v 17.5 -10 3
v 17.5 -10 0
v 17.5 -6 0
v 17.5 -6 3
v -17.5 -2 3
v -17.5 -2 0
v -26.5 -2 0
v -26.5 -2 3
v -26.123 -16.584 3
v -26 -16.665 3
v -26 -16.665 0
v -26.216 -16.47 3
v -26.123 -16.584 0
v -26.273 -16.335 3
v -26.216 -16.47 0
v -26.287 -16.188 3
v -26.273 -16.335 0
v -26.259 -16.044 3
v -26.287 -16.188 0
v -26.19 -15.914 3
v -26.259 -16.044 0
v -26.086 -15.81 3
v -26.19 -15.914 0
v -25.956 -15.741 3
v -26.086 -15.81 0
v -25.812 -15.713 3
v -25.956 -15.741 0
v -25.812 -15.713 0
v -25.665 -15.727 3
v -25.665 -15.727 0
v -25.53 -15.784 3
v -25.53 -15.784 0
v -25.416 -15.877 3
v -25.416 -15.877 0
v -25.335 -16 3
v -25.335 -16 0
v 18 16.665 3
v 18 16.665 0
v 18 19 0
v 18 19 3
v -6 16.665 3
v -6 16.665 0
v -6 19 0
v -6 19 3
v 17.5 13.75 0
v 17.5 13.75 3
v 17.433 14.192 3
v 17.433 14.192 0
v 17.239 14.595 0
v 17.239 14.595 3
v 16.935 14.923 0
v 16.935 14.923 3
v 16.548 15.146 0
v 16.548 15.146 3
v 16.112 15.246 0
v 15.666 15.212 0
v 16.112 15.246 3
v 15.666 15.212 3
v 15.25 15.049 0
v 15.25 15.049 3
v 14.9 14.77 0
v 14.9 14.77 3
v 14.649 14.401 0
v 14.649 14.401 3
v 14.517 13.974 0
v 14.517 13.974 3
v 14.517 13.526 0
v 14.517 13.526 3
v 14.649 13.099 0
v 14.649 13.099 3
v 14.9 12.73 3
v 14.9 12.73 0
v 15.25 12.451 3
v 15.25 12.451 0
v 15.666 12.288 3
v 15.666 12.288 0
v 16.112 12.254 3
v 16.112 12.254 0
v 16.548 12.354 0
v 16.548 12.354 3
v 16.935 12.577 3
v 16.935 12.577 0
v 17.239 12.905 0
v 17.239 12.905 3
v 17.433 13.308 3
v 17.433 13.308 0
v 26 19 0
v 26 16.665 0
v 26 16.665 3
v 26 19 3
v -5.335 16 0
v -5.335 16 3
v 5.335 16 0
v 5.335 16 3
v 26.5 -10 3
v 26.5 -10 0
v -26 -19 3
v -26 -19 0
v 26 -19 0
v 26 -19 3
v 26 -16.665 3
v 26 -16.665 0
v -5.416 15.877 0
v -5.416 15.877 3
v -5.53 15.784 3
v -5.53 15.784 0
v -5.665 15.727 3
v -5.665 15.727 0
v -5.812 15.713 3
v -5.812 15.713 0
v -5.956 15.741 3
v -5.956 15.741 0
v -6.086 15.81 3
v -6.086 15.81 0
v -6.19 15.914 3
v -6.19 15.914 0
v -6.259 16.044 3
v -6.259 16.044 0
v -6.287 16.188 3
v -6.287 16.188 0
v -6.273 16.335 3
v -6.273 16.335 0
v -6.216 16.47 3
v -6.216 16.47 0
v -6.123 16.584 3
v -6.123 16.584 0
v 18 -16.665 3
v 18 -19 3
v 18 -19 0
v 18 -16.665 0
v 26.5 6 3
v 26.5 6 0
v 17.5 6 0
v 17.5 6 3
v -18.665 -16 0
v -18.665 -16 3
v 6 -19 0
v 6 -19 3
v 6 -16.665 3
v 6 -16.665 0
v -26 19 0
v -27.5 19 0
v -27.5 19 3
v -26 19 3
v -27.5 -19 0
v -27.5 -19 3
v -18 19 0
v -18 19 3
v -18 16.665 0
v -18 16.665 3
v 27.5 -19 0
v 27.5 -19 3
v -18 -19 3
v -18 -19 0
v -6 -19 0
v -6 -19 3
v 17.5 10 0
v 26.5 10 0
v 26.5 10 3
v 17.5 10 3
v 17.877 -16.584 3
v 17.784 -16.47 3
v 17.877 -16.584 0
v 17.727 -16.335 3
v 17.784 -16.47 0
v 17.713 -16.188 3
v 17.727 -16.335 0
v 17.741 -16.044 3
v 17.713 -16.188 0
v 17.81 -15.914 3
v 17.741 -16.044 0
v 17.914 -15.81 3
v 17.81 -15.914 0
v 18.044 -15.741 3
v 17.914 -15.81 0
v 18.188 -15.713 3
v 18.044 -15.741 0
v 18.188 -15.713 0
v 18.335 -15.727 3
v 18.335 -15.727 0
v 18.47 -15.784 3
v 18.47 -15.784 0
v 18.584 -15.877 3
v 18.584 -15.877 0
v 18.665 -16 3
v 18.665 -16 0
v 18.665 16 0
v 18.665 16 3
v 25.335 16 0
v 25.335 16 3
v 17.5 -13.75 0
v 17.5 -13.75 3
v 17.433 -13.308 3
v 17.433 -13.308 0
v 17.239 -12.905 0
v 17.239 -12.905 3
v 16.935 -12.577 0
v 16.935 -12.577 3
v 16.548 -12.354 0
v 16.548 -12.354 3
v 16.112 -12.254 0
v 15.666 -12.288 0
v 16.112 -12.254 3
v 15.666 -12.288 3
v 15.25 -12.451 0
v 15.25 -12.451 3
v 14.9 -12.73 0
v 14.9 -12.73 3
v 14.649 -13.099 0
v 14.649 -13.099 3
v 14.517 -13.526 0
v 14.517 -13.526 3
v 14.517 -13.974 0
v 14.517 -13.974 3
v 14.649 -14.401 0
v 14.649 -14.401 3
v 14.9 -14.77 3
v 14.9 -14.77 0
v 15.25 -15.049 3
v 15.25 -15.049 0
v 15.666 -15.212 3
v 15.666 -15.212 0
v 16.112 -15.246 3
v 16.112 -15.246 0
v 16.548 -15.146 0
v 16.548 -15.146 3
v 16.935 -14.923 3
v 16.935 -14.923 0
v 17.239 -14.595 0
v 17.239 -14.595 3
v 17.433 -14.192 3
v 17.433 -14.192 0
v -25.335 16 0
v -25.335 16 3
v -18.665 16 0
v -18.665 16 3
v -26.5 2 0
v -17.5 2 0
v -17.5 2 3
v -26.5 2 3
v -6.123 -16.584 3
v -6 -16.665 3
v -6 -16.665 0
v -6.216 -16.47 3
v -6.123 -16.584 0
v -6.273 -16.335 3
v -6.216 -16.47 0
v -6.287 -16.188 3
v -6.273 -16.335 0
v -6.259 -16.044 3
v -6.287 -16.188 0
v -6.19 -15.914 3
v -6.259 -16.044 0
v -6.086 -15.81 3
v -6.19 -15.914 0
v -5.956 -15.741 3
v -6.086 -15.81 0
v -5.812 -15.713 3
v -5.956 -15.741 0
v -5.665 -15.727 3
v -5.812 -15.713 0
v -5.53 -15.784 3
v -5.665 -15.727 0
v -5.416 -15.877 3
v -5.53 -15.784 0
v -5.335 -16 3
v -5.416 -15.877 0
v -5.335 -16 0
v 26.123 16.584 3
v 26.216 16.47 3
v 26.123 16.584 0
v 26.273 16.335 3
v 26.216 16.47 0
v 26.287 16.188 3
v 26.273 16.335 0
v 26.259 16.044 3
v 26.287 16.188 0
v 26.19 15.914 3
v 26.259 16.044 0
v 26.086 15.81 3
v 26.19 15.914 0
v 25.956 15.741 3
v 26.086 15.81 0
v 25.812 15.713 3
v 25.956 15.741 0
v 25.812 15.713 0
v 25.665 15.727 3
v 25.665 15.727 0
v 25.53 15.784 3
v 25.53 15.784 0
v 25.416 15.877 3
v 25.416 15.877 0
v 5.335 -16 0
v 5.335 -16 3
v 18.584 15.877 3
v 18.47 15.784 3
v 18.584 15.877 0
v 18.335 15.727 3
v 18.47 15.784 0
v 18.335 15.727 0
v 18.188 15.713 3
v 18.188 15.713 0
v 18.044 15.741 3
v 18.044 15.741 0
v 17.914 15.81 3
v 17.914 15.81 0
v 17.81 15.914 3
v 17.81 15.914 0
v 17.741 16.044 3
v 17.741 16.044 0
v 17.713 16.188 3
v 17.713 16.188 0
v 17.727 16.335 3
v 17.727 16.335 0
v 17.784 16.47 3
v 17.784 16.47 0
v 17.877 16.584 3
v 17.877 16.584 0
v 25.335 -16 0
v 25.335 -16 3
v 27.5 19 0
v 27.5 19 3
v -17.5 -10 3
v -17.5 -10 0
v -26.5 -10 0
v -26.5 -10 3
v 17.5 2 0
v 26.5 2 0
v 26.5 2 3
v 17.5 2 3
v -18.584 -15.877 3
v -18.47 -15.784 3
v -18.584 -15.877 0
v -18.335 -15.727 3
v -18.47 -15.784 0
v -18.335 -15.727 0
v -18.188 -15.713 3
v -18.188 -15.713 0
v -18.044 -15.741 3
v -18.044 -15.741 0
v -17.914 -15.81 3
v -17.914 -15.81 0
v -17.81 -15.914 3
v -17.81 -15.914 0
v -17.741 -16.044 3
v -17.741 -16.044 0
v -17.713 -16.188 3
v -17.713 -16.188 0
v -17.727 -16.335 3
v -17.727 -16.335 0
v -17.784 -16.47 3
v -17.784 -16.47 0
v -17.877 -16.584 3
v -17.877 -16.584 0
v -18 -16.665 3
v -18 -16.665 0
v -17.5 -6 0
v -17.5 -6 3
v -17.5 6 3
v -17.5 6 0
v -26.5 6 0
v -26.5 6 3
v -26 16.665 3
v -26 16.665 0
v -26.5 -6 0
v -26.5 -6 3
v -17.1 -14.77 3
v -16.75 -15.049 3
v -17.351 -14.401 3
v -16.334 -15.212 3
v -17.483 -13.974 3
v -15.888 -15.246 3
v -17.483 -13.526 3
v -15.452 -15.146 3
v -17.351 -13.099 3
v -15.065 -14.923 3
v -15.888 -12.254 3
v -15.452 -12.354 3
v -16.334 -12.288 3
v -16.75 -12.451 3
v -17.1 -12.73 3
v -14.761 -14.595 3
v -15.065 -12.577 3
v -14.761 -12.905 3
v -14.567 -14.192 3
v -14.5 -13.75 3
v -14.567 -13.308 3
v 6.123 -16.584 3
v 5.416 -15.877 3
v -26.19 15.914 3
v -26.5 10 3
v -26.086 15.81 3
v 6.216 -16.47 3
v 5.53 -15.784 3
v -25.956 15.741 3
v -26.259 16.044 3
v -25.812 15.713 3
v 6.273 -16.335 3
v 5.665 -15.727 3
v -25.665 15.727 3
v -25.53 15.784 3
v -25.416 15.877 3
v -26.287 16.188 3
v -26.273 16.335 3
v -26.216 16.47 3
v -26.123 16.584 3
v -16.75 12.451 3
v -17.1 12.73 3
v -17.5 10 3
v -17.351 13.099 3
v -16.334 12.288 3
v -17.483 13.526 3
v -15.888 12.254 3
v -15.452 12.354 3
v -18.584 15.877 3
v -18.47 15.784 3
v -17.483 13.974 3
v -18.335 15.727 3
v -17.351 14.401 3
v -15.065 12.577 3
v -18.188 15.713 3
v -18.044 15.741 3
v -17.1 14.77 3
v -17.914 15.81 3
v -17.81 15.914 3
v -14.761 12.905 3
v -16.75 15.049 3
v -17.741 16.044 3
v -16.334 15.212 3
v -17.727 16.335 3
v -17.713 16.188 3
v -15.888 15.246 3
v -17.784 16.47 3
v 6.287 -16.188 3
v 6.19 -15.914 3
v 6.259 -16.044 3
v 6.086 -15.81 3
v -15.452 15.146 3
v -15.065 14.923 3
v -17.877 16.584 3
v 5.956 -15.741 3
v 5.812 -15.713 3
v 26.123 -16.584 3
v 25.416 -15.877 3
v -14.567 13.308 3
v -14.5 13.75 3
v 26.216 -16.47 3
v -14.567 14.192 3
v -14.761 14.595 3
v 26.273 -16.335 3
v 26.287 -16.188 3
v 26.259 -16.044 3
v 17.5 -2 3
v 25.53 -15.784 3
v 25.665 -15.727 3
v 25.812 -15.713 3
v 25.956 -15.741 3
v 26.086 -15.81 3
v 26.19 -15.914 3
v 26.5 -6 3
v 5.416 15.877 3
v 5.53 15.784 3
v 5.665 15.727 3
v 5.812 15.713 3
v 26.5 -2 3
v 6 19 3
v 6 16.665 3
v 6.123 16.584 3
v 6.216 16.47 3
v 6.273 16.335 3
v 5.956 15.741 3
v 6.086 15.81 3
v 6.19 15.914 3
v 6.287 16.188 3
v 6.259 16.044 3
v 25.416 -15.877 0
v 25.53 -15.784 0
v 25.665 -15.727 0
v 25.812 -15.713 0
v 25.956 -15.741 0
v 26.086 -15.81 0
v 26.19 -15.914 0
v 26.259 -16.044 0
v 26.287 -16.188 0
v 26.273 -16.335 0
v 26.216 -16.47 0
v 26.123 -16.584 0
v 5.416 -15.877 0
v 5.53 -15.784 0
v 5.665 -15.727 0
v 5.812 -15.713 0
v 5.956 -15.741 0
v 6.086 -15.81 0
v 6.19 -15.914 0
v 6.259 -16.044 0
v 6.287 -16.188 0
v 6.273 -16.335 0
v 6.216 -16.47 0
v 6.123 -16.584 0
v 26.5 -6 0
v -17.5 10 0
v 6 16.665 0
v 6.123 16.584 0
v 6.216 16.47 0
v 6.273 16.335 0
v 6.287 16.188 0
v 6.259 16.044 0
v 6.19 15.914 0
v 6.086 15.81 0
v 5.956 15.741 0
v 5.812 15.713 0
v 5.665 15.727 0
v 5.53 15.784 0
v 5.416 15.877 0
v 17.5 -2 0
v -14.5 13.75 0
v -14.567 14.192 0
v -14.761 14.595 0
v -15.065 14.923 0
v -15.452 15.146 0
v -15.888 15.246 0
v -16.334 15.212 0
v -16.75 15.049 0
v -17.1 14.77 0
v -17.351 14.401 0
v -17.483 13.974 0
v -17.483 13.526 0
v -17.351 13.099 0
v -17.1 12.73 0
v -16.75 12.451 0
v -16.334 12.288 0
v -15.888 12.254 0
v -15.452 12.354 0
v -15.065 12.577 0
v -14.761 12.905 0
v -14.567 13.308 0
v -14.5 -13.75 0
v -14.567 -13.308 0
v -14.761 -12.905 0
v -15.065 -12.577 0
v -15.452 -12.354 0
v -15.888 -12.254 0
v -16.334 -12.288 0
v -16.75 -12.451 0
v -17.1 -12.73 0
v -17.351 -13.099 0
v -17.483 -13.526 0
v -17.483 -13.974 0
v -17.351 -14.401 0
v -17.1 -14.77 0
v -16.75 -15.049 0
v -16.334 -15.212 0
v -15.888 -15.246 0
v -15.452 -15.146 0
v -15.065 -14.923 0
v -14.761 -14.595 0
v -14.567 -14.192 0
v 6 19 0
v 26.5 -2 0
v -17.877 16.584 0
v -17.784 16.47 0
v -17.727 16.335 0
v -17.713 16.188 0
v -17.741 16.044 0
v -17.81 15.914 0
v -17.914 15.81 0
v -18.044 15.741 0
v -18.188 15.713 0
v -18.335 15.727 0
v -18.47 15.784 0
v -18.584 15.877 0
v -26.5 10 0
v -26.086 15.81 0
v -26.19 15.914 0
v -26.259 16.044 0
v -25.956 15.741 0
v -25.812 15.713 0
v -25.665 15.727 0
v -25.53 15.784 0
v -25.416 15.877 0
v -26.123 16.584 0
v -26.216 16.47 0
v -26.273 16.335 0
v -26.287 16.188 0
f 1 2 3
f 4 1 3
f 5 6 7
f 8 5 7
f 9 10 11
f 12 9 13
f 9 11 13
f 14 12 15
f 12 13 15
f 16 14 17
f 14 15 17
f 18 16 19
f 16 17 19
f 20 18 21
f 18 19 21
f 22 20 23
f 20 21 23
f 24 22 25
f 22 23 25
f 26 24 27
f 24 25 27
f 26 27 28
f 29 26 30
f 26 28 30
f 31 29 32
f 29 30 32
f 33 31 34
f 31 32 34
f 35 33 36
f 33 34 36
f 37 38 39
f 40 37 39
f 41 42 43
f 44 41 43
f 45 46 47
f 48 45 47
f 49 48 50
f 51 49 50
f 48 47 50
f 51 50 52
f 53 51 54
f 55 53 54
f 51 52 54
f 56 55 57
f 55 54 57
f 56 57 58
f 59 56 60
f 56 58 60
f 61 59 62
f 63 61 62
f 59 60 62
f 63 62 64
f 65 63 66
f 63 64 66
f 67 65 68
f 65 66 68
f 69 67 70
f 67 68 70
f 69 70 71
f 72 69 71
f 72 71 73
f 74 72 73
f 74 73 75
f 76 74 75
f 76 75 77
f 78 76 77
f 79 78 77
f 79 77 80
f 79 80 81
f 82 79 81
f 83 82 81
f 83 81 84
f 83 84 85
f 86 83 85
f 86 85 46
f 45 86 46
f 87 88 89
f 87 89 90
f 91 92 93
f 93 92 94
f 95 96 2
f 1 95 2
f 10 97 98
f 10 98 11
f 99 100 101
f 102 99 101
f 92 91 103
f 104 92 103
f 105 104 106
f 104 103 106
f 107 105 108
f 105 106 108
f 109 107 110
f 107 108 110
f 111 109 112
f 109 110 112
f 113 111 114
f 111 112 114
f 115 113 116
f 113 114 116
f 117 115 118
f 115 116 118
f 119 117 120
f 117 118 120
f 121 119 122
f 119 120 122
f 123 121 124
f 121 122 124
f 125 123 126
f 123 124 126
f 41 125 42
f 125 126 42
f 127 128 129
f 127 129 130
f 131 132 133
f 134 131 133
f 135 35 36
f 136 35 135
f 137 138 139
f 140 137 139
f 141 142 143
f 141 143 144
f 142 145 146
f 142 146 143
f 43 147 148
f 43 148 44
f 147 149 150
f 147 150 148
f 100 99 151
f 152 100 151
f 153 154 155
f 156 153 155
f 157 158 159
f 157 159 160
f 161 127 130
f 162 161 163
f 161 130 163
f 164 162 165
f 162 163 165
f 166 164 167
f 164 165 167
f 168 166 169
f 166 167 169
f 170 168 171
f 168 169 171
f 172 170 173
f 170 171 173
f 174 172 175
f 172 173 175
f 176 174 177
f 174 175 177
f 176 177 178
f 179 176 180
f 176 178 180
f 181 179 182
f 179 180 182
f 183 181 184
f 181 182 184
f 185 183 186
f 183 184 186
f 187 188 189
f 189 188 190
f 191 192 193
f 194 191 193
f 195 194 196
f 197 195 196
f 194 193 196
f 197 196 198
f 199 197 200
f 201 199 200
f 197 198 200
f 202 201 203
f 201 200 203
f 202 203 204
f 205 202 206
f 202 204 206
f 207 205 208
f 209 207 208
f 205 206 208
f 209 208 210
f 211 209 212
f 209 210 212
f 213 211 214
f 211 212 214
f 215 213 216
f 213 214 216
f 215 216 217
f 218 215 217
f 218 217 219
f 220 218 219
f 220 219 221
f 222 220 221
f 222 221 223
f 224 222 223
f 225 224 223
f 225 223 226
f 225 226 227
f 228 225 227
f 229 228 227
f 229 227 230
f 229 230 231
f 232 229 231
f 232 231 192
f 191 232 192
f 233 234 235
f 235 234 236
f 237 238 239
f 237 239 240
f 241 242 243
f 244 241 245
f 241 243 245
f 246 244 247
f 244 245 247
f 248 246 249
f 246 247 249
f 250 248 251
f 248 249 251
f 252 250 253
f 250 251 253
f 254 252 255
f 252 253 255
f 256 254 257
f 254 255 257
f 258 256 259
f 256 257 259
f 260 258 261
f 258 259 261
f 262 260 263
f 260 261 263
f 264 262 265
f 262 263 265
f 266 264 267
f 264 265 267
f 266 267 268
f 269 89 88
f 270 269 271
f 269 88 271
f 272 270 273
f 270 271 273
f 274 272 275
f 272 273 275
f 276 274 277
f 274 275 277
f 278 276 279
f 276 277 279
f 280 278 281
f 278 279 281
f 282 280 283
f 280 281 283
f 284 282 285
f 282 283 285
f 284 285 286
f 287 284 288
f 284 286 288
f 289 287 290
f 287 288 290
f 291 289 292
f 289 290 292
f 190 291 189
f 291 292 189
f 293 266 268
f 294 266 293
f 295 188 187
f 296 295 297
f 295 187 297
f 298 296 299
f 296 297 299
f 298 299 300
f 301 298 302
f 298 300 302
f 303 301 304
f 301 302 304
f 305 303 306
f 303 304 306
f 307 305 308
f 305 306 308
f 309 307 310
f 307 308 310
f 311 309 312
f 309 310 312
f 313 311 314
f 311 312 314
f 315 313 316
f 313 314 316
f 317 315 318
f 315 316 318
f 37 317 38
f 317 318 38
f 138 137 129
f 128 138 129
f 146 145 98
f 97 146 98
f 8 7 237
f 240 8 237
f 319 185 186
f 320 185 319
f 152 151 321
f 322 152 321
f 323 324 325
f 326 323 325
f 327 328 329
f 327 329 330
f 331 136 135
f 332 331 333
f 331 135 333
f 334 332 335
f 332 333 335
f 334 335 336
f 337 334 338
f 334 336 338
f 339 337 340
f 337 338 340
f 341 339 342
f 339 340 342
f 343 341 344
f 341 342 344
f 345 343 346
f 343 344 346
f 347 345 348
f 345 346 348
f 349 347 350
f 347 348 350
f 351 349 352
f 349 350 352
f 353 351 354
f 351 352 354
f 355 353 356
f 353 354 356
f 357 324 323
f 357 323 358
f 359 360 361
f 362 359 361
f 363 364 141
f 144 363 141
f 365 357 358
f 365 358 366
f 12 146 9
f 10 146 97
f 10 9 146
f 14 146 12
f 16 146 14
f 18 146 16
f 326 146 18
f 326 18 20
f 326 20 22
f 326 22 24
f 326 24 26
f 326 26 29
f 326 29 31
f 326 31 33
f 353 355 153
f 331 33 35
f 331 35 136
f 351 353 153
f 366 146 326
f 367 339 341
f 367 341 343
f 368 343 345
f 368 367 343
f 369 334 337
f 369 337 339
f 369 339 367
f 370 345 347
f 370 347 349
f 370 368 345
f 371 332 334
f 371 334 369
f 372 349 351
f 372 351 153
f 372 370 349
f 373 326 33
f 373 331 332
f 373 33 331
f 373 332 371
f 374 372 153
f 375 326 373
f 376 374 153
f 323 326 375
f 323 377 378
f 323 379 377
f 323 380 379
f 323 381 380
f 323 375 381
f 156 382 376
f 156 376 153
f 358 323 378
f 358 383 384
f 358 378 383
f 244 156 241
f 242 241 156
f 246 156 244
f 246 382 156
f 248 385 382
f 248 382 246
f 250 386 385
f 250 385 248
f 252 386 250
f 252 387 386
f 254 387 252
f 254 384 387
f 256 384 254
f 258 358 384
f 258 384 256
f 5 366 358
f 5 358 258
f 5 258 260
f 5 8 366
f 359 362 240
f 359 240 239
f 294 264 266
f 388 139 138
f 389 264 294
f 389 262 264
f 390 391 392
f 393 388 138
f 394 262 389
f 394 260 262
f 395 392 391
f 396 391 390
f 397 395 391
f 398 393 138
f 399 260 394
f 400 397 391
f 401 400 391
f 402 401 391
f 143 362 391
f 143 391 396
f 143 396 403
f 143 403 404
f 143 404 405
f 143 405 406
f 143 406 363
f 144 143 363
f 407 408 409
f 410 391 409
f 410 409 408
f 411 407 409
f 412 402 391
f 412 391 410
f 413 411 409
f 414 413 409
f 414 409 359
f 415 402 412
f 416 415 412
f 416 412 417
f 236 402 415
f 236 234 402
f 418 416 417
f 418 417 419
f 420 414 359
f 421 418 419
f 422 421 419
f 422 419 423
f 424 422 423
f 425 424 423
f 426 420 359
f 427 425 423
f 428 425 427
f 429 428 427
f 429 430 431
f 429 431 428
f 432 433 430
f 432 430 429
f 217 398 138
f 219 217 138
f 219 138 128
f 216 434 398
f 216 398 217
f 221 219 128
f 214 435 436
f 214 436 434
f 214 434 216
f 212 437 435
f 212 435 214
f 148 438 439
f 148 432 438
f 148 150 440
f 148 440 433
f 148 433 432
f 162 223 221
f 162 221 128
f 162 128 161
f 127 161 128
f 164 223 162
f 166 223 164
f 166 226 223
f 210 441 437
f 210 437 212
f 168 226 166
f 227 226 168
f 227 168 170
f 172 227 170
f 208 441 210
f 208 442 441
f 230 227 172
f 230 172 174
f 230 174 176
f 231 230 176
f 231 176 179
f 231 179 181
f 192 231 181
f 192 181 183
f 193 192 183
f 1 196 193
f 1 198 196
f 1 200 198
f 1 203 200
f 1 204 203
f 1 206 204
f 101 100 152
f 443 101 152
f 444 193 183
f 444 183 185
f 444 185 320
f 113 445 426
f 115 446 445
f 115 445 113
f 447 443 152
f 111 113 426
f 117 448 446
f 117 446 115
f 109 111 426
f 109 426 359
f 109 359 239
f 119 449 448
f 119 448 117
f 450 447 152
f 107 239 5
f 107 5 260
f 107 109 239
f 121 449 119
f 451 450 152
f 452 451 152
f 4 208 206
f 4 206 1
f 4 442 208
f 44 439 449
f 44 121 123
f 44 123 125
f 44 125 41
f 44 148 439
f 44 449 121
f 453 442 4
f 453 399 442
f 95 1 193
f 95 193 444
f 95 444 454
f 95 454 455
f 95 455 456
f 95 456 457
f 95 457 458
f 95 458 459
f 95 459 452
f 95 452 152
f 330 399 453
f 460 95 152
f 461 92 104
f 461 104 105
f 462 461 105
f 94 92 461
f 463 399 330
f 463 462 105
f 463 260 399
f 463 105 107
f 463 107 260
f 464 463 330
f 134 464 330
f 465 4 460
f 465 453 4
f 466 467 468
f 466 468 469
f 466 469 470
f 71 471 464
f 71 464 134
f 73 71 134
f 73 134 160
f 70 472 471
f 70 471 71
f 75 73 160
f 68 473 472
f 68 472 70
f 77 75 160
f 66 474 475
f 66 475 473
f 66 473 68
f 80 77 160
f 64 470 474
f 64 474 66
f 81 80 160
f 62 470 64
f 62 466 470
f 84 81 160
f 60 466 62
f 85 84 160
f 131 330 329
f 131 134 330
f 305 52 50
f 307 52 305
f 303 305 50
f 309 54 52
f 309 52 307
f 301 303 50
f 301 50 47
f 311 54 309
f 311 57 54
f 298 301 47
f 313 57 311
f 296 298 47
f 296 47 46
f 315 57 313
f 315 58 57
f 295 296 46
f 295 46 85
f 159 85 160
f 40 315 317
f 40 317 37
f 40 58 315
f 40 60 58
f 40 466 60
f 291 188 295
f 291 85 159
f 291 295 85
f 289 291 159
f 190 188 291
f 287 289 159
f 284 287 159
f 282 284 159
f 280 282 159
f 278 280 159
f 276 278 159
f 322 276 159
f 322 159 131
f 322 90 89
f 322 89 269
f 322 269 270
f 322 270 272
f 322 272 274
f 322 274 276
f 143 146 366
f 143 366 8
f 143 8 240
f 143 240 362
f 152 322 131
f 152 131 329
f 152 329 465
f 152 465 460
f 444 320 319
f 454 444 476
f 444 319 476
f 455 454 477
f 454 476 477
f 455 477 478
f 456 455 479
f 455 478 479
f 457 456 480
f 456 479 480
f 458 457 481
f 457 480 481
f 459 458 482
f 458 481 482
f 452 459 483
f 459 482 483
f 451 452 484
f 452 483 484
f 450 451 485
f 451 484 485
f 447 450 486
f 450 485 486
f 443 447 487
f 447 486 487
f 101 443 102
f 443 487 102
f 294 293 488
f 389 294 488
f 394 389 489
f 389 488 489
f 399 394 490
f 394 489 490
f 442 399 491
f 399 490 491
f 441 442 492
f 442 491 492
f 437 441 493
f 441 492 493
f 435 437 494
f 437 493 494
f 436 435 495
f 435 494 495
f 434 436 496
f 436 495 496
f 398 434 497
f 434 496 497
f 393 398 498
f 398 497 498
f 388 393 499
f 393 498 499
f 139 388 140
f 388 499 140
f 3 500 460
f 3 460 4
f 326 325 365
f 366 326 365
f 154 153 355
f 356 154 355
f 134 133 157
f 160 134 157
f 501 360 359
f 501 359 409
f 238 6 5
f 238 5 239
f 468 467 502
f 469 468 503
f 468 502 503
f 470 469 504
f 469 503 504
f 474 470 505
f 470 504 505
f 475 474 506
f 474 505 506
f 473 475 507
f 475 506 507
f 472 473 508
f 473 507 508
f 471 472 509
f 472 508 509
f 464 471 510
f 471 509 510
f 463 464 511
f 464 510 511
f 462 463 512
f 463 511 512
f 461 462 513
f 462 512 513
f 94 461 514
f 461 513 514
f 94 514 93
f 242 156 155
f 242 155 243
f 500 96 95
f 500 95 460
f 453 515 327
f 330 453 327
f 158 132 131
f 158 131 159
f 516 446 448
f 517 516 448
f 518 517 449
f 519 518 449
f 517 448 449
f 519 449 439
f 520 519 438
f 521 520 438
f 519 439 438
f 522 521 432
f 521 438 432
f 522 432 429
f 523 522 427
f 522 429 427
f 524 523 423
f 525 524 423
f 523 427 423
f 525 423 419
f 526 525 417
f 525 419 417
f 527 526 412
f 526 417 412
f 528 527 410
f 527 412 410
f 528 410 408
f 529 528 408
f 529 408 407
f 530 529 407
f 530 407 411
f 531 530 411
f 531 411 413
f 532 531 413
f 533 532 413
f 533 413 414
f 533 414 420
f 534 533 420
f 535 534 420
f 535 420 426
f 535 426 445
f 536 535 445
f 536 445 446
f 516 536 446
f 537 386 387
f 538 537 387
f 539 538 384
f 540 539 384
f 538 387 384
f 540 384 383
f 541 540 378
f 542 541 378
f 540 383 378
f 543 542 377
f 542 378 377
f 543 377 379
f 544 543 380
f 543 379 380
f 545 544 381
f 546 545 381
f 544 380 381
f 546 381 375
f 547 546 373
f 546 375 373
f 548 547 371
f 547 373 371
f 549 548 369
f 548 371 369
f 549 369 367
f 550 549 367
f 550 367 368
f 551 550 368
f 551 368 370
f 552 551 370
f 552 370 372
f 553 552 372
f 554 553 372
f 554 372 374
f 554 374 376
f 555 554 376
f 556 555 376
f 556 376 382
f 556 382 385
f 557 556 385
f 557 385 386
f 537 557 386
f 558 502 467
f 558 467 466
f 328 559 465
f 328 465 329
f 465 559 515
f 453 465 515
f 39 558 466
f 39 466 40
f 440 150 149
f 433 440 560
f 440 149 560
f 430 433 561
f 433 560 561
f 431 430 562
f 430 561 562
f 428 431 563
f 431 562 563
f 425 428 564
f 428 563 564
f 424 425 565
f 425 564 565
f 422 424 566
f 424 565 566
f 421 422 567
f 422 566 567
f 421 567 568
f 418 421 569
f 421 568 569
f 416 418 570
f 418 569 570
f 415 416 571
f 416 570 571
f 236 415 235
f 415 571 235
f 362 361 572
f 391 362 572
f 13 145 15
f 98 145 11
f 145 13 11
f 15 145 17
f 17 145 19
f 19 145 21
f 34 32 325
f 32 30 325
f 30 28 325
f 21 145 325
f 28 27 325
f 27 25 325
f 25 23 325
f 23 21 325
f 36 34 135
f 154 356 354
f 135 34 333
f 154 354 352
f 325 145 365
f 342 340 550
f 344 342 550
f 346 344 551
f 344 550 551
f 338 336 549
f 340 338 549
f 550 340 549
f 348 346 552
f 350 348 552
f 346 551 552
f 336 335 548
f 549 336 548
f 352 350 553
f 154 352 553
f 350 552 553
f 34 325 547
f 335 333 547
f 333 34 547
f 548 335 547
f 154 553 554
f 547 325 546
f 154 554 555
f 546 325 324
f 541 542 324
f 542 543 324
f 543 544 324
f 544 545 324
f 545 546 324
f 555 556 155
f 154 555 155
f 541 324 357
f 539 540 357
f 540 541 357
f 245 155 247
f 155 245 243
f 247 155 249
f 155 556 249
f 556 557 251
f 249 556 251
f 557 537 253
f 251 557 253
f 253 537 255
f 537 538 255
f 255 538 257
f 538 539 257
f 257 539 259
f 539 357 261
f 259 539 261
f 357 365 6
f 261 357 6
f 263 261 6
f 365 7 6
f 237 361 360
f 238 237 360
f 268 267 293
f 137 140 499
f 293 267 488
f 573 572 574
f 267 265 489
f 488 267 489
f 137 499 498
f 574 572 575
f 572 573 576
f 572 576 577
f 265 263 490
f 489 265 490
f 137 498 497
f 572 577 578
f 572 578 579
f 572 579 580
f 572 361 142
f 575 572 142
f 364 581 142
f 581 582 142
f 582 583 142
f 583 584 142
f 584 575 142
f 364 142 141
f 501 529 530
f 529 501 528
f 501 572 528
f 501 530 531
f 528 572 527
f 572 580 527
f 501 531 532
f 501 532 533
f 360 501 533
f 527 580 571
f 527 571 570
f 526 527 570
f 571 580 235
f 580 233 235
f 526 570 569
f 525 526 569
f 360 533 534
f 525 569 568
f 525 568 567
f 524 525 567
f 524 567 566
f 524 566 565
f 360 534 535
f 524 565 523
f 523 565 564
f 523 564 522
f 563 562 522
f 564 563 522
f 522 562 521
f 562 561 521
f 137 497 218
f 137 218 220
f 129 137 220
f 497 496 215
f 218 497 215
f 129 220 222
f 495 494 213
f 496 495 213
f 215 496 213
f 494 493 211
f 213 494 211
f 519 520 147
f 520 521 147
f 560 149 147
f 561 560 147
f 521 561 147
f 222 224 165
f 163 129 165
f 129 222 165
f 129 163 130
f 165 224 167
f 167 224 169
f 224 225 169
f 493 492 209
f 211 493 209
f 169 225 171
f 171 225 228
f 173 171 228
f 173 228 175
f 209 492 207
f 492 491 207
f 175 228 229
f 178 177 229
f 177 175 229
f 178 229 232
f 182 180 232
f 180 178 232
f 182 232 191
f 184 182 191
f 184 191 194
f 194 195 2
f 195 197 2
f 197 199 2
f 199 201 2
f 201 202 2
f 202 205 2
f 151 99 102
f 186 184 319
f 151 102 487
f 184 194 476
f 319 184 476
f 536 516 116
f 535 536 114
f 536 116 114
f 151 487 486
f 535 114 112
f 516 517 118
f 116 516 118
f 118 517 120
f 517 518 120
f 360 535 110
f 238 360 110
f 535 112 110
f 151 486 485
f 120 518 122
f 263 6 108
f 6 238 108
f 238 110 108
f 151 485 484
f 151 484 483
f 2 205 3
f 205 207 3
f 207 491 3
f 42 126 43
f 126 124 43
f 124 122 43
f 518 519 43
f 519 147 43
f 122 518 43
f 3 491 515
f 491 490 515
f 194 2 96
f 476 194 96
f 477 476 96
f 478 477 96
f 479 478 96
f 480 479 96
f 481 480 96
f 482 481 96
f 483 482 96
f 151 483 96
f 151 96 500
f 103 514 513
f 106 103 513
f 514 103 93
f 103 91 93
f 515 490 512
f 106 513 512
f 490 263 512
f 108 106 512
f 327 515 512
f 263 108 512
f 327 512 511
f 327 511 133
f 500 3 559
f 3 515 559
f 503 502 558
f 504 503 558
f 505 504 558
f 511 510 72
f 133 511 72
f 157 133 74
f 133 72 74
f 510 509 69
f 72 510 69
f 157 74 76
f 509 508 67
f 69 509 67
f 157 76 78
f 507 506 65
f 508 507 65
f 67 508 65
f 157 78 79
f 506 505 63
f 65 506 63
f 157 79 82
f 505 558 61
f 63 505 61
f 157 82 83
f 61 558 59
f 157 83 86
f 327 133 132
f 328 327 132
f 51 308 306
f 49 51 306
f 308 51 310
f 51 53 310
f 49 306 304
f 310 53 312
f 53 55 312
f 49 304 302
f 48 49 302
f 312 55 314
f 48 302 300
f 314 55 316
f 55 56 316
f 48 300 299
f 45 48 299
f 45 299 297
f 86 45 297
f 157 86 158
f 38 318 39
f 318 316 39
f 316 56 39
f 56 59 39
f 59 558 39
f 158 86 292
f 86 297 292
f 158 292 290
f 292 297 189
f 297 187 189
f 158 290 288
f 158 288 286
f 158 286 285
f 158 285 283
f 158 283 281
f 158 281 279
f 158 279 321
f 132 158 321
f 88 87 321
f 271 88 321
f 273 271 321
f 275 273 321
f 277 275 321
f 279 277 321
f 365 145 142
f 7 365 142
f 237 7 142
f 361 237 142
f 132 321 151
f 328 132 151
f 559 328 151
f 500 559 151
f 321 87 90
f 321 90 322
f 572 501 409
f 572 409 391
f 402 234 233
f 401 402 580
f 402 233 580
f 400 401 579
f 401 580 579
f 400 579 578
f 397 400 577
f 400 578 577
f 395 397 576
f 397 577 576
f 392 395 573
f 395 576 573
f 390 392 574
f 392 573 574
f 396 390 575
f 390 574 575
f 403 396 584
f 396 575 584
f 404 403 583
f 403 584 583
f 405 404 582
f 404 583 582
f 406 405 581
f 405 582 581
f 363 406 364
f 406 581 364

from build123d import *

# Parameters (mm, degrees)
SKETCH_1_W          = 55
SKETCH_1_H          = 38
EXTRUDE_1_DEPTH     = 3
SKETCH_2_R          = 1.5
CUT_EXTRUDE_1_DEPTH = 30
SKETCH_3_W          = 8
SKETCH_3_H          = 3
CUT_EXTRUDE_2_DEPTH = 30
SKETCH_5_W          = 12
SKETCH_5_H          = 3
CUT_EXTRUDE_4_DEPTH = 10
SKETCH_6_W          = 9
SKETCH_6_H          = 4
CUT_EXTRUDE_5_DEPTH = 10
SKETCH_7_R          = 0.5
CUT_EXTRUDE_6_DEPTH = 10


with BuildPart() as part:
    # 草图1 → 凸台-拉伸1 (new body)
    with BuildSketch(Plane.XY):
        Rectangle(SKETCH_1_W, SKETCH_1_H)
    extrude(amount=EXTRUDE_1_DEPTH)

    # 草图2 → 切除-拉伸1 (cut)
    with BuildSketch(Plane.XY.offset(3)):
        with Locations((16, 13.75)):
            Circle(SKETCH_2_R)
        with Locations((16, -13.75)):
            Circle(SKETCH_2_R)
        with Locations((-16, 13.75)):
            Circle(SKETCH_2_R)
        with Locations((-16, -13.75)):
            Circle(SKETCH_2_R)
    extrude(amount=-CUT_EXTRUDE_1_DEPTH, mode=Mode.SUBTRACT)

    # 草图3 → 切除-拉伸2 (cut)
    with BuildSketch(Plane.XY.offset(3)):
        with Locations((22, 17.5)):
            Rectangle(SKETCH_3_W, SKETCH_3_H)
        with Locations((22, -17.5)):
            Rectangle(SKETCH_3_W, SKETCH_3_H)
        with Locations((-22, 17.5)):
            Rectangle(SKETCH_3_W, SKETCH_3_H)
        with Locations((-22, -17.5)):
            Rectangle(SKETCH_3_W, SKETCH_3_H)
    extrude(amount=-CUT_EXTRUDE_2_DEPTH, mode=Mode.SUBTRACT)

    # 草图5 → 切除-拉伸4 (cut)
    with BuildSketch(Plane.XY.offset(3)):
        with Locations((0, -17.5)):
            Rectangle(SKETCH_5_W, SKETCH_5_H)
        with Locations((0, 17.5)):
            Rectangle(SKETCH_5_W, SKETCH_5_H)
    extrude(amount=-CUT_EXTRUDE_4_DEPTH, mode=Mode.SUBTRACT)

    # 草图6 → 切除-拉伸5 (cut)
    with BuildSketch(Plane(origin=(0, 0, 0), x_dir=(-1, 0, 0), z_dir=(0, 0, -1))):
        with Locations((-22, -8)):
            Rectangle(SKETCH_6_W, SKETCH_6_H)
        with Locations((-22, 0)):
            Rectangle(SKETCH_6_W, SKETCH_6_H)
        with Locations((-22, 8)):
            Rectangle(SKETCH_6_W, SKETCH_6_H)
        with Locations((22, -8)):
            Rectangle(SKETCH_6_W, SKETCH_6_H)
        with Locations((22, 0)):
            Rectangle(SKETCH_6_W, SKETCH_6_H)
        with Locations((22, 8)):
            Rectangle(SKETCH_6_W, SKETCH_6_H)
    extrude(amount=-CUT_EXTRUDE_5_DEPTH, mode=Mode.SUBTRACT)

    # 草图7 → 切除-拉伸6 (cut)
    with BuildSketch(Plane(origin=(0, 0, 0), x_dir=(-1, 0, 0), z_dir=(0, 0, -1))):
        with Locations((-18.212132034, -16.212132034)):
            Circle(SKETCH_7_R)
        with Locations((-25.787867966, -16.212132034)):
            Circle(SKETCH_7_R)
        with Locations((-25.787867966, 16.212132034)):
            Circle(SKETCH_7_R)
        with Locations((-18.212132034, 16.212132034)):
            Circle(SKETCH_7_R)
        with Locations((-5.787867966, -16.212132034)):
            Circle(SKETCH_7_R)
        with Locations((25.787867966, -16.212132034)):
            Circle(SKETCH_7_R)
        with Locations((18.212132034, -16.212132034)):
            Circle(SKETCH_7_R)
        with Locations((18.212132034, 16.212132034)):
            Circle(SKETCH_7_R)
        with Locations((25.787867966, 16.212132034)):
            Circle(SKETCH_7_R)
        with Locations((-5.787867966, 16.212132034)):
            Circle(SKETCH_7_R)
        with Locations((5.787867966, 16.212132034)):
            Circle(SKETCH_7_R)
        with Locations((5.787867966, -16.212132034)):
            Circle(SKETCH_7_R)
    extrude(amount=-CUT_EXTRUDE_6_DEPTH, mode=Mode.SUBTRACT)


solid = part.part
